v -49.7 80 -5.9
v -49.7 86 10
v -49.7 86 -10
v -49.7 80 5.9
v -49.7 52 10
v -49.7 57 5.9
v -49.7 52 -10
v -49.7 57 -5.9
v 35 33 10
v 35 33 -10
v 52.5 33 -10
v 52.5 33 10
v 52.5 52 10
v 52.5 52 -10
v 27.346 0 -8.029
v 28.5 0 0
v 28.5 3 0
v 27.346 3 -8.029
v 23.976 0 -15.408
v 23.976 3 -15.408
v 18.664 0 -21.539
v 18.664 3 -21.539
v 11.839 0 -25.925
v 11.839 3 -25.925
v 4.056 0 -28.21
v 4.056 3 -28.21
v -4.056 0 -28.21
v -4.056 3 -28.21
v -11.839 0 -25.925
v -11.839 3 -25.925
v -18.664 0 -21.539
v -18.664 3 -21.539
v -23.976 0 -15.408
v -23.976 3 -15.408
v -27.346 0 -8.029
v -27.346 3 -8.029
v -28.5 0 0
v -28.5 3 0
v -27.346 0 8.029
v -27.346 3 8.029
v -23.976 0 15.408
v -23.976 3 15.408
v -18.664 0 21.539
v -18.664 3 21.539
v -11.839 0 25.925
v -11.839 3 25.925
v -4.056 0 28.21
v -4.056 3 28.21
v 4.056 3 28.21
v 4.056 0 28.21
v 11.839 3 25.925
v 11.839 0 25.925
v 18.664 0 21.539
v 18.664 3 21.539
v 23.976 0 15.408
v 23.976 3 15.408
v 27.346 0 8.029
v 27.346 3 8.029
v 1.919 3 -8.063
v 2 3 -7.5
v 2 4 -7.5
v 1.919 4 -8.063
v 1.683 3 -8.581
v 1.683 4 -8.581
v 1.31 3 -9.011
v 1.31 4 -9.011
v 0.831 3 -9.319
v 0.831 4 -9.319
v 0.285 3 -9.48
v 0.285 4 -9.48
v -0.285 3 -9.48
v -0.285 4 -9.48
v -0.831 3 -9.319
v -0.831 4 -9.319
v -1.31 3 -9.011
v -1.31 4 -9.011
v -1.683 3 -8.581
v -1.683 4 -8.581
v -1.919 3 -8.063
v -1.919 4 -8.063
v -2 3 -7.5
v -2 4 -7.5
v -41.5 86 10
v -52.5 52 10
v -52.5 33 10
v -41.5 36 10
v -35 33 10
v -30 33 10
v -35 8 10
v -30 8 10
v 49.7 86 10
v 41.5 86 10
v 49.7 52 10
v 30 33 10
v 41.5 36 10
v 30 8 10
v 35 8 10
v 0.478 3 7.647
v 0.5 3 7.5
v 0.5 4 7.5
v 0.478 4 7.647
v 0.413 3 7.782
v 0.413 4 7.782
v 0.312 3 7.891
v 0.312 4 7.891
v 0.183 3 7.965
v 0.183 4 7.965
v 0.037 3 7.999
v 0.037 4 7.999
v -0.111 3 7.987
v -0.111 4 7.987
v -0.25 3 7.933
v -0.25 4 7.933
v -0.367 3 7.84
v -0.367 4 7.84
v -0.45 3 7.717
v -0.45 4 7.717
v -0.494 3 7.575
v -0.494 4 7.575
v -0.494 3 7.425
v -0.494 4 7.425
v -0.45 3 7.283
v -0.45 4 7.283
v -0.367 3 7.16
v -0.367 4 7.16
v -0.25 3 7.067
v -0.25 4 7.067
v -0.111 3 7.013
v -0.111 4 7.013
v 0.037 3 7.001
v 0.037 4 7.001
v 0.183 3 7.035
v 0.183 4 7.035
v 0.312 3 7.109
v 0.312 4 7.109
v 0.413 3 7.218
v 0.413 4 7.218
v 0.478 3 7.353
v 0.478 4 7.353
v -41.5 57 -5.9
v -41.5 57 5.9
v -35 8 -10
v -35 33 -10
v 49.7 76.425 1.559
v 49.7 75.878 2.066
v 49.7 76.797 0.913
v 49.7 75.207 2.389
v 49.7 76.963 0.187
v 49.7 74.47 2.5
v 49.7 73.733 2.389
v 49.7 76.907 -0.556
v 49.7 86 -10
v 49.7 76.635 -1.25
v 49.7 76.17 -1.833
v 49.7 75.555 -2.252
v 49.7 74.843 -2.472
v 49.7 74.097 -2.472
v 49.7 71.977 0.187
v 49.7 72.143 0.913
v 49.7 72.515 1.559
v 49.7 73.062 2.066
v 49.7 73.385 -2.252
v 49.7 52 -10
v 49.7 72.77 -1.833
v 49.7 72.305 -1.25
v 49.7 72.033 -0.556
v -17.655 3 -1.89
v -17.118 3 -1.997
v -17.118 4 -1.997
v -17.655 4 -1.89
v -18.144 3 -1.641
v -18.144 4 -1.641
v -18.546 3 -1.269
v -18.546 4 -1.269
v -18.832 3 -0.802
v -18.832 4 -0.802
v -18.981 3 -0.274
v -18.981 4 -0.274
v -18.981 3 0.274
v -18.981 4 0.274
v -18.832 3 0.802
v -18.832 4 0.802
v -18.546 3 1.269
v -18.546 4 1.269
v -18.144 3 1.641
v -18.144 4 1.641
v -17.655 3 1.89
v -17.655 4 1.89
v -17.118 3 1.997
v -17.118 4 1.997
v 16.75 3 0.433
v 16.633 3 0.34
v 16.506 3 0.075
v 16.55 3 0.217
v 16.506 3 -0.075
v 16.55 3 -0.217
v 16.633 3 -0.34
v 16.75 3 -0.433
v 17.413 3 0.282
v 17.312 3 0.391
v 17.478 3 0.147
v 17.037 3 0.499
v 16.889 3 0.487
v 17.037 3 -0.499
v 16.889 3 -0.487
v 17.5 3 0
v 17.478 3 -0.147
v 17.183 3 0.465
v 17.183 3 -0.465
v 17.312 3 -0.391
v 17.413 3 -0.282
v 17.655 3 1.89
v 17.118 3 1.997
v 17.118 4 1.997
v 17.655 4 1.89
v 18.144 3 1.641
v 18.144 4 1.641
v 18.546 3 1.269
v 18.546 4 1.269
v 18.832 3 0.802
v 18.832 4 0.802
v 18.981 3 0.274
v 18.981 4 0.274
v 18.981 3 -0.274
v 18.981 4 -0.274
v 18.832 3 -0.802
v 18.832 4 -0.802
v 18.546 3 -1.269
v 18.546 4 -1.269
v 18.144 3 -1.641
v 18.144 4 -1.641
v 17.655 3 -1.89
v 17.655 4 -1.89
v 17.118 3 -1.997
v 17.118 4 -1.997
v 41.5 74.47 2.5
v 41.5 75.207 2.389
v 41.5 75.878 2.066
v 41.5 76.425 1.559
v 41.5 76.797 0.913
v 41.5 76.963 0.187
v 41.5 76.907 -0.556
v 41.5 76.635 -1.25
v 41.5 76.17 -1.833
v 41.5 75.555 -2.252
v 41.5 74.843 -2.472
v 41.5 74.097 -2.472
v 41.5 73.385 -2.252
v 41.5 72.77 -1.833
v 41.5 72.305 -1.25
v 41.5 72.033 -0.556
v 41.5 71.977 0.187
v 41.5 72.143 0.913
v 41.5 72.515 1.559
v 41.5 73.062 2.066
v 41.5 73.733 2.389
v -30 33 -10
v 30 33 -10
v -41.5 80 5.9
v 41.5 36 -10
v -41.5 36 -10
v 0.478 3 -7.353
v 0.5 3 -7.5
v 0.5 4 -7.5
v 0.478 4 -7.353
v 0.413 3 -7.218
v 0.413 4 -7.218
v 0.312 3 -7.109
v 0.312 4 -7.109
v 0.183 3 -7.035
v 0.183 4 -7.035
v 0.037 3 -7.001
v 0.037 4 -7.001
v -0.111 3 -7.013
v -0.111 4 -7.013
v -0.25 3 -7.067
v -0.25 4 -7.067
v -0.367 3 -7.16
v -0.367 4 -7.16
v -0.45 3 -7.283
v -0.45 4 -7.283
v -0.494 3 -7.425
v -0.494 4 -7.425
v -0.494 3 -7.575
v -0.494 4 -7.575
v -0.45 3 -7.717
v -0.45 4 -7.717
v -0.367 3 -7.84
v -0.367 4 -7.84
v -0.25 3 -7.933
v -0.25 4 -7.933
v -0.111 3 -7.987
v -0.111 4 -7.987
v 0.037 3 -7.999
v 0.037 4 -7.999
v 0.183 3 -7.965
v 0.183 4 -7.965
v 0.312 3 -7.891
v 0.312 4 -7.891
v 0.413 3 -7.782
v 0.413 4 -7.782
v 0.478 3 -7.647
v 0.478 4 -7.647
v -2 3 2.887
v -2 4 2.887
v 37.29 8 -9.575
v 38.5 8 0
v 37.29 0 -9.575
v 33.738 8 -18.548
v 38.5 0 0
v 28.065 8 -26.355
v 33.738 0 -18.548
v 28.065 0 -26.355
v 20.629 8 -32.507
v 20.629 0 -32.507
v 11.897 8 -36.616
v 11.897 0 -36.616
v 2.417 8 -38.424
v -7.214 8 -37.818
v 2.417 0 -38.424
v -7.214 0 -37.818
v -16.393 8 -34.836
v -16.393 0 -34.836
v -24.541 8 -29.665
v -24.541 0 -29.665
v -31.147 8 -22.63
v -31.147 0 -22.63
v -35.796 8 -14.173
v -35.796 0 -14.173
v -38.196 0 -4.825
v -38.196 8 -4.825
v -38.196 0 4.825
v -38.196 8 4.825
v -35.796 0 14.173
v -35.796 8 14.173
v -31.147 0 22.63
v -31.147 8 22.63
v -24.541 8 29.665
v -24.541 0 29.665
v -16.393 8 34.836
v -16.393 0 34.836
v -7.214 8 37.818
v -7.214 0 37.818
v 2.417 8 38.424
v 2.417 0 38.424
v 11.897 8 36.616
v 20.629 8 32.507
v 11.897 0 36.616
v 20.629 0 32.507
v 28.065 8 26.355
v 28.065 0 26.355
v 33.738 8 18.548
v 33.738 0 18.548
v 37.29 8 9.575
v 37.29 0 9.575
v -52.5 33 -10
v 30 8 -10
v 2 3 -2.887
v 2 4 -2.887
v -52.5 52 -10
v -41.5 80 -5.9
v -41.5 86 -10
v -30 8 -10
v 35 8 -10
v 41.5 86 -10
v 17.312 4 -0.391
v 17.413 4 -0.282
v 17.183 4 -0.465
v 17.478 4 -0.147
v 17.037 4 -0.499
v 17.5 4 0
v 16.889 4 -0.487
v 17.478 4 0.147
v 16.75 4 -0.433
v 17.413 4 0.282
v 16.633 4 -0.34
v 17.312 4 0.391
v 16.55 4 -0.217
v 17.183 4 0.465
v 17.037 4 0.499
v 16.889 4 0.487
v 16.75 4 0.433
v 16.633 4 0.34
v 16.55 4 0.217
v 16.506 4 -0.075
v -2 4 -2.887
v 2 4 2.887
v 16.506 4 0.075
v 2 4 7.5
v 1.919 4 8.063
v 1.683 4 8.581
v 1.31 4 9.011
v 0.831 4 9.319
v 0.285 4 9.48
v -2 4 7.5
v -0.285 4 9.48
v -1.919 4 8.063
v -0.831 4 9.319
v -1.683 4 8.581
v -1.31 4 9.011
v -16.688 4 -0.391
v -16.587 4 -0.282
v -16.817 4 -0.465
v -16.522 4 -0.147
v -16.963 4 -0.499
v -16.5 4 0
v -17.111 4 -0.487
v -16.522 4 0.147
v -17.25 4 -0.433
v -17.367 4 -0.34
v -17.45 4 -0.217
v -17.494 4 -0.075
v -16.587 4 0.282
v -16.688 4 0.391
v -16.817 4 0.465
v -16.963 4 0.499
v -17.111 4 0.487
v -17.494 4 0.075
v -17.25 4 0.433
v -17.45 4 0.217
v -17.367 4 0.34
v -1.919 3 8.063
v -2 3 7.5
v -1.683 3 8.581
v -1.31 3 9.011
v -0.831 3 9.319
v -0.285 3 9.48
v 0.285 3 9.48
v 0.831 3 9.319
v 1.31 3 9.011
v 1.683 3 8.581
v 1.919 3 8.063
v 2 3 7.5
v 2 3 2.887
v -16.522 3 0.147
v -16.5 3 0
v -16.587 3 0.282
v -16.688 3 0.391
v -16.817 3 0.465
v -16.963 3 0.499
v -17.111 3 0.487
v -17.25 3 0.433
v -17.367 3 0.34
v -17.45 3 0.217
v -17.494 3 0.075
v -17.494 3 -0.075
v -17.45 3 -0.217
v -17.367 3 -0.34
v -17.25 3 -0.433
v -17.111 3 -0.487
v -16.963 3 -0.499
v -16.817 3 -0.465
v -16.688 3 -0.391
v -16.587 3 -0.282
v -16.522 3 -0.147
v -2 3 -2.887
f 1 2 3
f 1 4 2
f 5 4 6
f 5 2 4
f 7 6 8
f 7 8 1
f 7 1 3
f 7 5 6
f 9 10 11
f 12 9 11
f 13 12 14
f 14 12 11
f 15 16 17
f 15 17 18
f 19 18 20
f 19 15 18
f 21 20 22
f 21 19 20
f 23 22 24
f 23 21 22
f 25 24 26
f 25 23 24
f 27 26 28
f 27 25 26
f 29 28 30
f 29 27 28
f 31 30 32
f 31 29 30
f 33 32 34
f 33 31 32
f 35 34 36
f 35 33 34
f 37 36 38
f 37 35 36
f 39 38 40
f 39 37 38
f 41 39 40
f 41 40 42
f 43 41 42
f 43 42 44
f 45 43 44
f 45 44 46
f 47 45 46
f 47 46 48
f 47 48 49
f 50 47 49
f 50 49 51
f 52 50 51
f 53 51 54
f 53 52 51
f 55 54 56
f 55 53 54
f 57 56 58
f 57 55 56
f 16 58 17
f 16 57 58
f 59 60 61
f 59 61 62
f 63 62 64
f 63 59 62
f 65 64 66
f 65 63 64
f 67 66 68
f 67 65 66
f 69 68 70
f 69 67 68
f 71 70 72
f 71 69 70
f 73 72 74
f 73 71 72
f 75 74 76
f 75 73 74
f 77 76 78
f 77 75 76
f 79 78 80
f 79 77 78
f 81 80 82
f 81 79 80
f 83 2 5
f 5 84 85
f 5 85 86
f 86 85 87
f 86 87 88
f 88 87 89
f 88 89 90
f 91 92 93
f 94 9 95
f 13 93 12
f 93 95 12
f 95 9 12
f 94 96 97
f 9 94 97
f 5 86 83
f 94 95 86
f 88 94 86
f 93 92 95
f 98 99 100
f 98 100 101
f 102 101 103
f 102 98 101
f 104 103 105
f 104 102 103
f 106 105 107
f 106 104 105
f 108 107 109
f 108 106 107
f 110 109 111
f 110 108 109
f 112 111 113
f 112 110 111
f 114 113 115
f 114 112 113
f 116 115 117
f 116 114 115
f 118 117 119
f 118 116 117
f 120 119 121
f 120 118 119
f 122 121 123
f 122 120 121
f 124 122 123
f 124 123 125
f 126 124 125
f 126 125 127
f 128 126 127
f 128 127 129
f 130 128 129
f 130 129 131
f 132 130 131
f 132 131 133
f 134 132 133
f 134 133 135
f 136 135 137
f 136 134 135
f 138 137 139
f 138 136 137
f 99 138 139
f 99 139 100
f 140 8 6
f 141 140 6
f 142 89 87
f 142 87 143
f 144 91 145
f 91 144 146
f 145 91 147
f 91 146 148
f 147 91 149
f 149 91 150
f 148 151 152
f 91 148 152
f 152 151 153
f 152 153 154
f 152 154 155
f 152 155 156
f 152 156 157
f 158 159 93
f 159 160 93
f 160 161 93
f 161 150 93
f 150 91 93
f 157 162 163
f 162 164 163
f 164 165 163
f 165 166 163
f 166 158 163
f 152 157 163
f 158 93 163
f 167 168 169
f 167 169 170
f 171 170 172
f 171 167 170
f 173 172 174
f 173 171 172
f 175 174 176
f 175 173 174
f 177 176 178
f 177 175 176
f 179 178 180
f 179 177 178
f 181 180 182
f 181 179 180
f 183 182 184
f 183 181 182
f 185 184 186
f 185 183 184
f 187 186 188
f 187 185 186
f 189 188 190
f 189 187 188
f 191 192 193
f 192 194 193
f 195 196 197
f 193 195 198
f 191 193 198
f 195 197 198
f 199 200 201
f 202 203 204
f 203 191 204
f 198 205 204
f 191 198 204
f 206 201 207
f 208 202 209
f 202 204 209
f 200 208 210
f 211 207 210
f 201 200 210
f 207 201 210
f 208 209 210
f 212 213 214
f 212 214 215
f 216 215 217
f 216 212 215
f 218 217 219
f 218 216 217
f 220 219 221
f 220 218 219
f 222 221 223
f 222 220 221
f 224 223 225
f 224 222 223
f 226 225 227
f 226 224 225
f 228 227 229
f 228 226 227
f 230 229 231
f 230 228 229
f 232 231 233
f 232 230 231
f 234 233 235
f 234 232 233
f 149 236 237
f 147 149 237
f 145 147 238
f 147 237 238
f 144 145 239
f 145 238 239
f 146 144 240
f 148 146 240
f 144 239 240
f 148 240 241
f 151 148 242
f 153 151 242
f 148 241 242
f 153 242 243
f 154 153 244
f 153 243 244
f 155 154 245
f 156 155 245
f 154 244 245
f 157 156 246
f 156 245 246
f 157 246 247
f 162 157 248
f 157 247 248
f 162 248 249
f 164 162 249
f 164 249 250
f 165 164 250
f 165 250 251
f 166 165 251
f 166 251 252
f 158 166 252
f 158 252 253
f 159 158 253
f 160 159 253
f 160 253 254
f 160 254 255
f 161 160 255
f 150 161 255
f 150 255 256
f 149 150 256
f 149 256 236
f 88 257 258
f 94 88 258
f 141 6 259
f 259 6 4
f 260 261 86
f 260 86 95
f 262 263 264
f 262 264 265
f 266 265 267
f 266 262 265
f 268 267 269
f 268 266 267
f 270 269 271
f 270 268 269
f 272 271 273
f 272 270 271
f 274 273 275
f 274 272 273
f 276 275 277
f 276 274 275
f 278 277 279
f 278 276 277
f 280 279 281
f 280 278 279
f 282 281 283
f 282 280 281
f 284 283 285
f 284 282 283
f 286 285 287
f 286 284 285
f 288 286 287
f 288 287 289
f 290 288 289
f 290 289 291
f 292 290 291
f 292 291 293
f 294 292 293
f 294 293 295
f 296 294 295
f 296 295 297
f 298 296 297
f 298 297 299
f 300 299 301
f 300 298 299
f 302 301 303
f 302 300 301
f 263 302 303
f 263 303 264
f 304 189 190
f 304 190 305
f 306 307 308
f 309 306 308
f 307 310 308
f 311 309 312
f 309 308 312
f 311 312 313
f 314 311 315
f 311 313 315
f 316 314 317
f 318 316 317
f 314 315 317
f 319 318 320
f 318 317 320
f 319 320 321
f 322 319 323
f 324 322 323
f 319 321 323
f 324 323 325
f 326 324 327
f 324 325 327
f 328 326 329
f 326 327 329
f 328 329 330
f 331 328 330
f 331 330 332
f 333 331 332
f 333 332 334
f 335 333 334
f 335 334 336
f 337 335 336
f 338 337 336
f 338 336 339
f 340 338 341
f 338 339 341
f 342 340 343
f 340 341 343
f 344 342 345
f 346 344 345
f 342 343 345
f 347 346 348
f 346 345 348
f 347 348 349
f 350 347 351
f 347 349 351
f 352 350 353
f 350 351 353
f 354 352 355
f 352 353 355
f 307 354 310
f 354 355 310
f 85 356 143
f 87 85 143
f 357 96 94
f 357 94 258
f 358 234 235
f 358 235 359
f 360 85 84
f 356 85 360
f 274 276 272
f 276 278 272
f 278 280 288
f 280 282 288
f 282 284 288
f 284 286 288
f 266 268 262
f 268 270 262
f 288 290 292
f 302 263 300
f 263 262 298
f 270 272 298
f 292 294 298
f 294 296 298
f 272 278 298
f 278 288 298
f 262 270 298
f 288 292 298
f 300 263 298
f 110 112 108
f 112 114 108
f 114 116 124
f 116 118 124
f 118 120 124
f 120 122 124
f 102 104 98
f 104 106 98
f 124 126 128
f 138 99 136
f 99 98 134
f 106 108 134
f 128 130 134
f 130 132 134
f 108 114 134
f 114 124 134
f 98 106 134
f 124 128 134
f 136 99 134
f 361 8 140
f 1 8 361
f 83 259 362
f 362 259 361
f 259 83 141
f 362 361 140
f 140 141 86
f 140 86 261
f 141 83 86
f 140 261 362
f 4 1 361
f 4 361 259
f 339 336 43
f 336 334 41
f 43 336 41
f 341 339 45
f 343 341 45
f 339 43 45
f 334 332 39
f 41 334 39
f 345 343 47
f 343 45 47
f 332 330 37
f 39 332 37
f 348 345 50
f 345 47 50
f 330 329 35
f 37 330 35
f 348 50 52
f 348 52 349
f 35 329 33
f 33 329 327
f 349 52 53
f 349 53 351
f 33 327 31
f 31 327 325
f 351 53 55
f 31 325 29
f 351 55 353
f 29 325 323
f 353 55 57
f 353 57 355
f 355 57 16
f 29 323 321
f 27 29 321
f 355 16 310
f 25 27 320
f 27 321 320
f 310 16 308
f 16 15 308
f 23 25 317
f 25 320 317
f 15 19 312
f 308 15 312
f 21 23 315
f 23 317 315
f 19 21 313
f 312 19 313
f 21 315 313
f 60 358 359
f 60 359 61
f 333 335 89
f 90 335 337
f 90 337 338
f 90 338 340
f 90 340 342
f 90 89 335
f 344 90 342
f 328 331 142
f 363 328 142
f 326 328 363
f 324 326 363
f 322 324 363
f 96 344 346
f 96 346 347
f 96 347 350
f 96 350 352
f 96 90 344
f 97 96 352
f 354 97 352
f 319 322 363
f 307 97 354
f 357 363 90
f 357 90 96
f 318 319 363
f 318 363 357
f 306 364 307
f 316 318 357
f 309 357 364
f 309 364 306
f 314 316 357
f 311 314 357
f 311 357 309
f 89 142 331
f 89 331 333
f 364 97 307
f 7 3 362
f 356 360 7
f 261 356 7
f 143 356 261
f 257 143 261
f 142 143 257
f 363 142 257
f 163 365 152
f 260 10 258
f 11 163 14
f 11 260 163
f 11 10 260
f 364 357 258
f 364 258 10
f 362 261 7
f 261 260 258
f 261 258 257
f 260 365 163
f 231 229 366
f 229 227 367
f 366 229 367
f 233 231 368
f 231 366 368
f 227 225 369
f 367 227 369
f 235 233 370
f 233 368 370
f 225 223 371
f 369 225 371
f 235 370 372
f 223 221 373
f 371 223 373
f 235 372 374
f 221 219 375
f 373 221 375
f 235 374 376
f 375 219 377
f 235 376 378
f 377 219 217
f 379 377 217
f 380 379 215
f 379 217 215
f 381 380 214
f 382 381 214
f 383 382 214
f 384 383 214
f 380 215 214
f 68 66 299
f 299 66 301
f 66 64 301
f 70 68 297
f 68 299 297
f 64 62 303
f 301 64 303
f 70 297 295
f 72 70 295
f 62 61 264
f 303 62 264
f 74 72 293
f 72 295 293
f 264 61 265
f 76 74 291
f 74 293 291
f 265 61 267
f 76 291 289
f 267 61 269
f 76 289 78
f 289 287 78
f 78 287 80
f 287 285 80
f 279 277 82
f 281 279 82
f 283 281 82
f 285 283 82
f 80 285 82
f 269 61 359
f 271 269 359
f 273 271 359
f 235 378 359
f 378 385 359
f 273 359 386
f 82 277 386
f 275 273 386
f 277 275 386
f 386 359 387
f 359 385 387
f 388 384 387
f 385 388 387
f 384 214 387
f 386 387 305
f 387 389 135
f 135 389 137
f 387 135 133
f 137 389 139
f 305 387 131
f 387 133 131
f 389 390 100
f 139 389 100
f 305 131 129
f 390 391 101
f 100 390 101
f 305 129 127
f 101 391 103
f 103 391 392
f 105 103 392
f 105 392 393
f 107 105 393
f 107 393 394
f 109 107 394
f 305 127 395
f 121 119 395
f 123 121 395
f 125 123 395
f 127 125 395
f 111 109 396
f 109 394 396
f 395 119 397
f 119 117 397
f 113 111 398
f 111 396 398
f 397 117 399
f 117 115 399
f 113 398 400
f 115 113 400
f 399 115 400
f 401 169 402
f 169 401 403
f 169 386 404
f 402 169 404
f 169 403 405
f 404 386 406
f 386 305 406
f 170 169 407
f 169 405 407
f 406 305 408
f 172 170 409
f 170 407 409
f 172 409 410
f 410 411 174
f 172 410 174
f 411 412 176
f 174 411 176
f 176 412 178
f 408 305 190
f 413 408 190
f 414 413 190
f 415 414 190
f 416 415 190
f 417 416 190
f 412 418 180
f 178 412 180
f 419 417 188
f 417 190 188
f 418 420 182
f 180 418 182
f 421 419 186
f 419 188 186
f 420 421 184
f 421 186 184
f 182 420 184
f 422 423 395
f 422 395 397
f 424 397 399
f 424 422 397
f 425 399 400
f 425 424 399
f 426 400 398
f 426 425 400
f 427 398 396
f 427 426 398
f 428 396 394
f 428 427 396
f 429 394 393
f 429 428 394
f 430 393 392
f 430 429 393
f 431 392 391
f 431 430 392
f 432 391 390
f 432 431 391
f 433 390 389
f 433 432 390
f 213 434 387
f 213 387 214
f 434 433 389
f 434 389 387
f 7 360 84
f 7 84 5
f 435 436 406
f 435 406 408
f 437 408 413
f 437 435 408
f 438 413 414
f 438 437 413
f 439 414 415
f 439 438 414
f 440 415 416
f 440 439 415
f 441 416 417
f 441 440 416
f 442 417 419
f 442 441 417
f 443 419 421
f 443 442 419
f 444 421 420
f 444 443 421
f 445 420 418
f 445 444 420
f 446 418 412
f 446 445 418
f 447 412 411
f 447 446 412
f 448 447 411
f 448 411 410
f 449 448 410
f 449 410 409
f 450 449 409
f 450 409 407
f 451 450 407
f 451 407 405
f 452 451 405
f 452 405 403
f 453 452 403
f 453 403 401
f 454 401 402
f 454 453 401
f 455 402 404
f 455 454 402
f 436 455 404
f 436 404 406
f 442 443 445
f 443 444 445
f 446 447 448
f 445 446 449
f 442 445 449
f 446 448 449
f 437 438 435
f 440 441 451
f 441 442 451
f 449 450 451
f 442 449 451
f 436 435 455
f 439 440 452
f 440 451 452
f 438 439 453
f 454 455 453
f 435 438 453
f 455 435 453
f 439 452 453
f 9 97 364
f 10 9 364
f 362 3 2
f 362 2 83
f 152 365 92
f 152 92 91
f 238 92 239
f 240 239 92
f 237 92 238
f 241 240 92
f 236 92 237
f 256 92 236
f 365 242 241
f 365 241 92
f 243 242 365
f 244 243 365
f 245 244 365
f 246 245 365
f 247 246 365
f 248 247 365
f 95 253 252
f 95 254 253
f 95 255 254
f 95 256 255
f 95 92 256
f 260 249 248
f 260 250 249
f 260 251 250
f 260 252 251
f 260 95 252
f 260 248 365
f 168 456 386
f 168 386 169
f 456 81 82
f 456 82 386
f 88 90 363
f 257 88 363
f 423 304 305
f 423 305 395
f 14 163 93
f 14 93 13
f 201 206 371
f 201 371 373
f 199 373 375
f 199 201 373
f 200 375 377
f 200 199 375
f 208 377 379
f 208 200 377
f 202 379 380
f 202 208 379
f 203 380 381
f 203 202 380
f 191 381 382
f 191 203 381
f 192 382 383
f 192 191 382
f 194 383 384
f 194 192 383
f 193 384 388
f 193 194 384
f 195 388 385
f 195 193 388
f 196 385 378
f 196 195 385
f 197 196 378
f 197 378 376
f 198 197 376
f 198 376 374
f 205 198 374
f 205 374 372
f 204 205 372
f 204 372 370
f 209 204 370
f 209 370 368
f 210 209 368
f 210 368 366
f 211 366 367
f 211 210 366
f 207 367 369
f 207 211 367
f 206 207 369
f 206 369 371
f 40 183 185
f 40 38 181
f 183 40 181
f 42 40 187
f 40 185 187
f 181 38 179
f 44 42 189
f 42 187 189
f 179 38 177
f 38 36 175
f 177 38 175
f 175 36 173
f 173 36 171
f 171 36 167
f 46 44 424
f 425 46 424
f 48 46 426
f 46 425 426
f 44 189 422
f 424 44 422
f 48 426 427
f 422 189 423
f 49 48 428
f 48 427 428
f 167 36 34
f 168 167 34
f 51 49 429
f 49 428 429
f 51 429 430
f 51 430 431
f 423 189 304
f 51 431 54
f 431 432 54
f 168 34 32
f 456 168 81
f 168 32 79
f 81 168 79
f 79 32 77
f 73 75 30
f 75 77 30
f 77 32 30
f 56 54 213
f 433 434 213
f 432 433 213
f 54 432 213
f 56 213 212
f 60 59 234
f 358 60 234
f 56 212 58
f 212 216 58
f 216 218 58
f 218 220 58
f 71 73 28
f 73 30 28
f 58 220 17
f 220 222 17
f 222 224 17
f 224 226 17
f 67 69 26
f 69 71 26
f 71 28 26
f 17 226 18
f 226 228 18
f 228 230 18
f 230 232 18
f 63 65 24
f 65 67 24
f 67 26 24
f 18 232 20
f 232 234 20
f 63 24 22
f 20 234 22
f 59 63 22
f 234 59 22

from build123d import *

# Parameters (mm, degrees)
SKETCH1_R           = 38.5
SKETCH1_R_2         = 28.5
BOSS_EXTRUDE1_DEPTH = 3
SKETCH3_R           = 38.5
BOSS_EXTRUDE2_DEPTH = 5
SKETCH4_W           = 5
SKETCH4_H           = 20
BOSS_EXTRUDE3_DEPTH = 25
SKETCH5_W           = 105
SKETCH5_H           = 20
BOSS_EXTRUDE4_DEPTH = 3
SKETCH6_W           = 2.8
SKETCH6_H           = 20
BOSS_EXTRUDE5_DEPTH = 16
SKETCH7_W           = 8.2
SKETCH7_H           = 20
BOSS_EXTRUDE6_DEPTH = 50
SKETCH8_W           = 11.8
SKETCH8_H           = 23
CUT_EXTRUDE1_DEPTH  = 50
SKETCH9_R           = 2.5
CUT_EXTRUDE2_DEPTH  = 50
SKETCH10_R          = 0.5
CUT_EXTRUDE3_DEPTH  = 1


with BuildPart() as part:
    # Sketch1 → Boss-Extrude1 (new body)
    with BuildSketch(Plane(origin=(0, 0, 0), x_dir=(1, 0, 0), z_dir=(0, 1, 0))):
        Circle(SKETCH1_R)
        Circle(SKETCH1_R_2, mode=Mode.SUBTRACT)
    extrude(amount=BOSS_EXTRUDE1_DEPTH)

    # Sketch3 → Boss-Extrude2 (add)
    with BuildSketch(Plane(origin=(0, 3, 0), x_dir=(1, 0, 0), z_dir=(0, 1, 0))):
        Circle(SKETCH3_R)
    extrude(amount=BOSS_EXTRUDE2_DEPTH)

    # Sketch4 → Boss-Extrude3 (add)
    with BuildSketch(Plane(origin=(0, 8, 0), x_dir=(1, 0, 0), z_dir=(0, 1, 0))):
        with Locations((-32.5, 0)):
            Rectangle(SKETCH4_W, SKETCH4_H)
        with Locations((32.5, 0)):
            Rectangle(SKETCH4_W, SKETCH4_H)
    extrude(amount=BOSS_EXTRUDE3_DEPTH)

    # Sketch5 → Boss-Extrude4 (add)
    with BuildSketch(Plane(origin=(0, 33, 0), x_dir=(1, 0, 0), z_dir=(0, 1, 0))):
        Rectangle(SKETCH5_W, SKETCH5_H)
    extrude(amount=BOSS_EXTRUDE4_DEPTH)

    # Sketch6 → Boss-Extrude5 (add)
    with BuildSketch(Plane(origin=(0, 36, 0), x_dir=(1, 0, 0), z_dir=(0, 1, 0))):
        with Locations((-51.1, 0)):
            Rectangle(SKETCH6_W, SKETCH6_H)
        with Locations((51.1, 0)):
            Rectangle(SKETCH6_W, SKETCH6_H)
    extrude(amount=BOSS_EXTRUDE5_DEPTH)

    # Sketch7 → Boss-Extrude6 (add)
    with BuildSketch(Plane(origin=(0, 36, 0), x_dir=(1, 0, 0), z_dir=(0, 1, 0))):
        with Locations((-45.6, 0)):
            Rectangle(SKETCH7_W, SKETCH7_H)
        with Locations((45.6, 0)):
            Rectangle(SKETCH7_W, SKETCH7_H)
    extrude(amount=BOSS_EXTRUDE6_DEPTH)

    # Sketch8 → Cut-Extrude1 (cut)
    with BuildSketch(Plane.ZY.offset(49.7)):
        with Locations((0, 68.5)):
            Rectangle(SKETCH8_W, SKETCH8_H)
    extrude(amount=-CUT_EXTRUDE1_DEPTH, mode=Mode.SUBTRACT)

    # Sketch9 → Cut-Extrude2 (cut)
    with BuildSketch(Plane.ZY.offset(-41.5)):
        with Locations((0, 74.47)):
            Circle(SKETCH9_R)
    extrude(amount=-CUT_EXTRUDE2_DEPTH, mode=Mode.SUBTRACT)

    # Sketch10 → Cut-Extrude3 (cut)
    with BuildSketch(Plane.XZ.offset(-3)):
        with BuildLine():
            Line((2, 7.5), (2, 2.88735269))
            Line((2, 2.88735269), (17.117647059, 1.996536794))
            ThreePointArc((17.117647059, 1.996536794), (19, 0), (17.117647059, -1.996536794))
            Line((17.117647059, -1.996536794), (2, -2.88735269))
            Line((2, -2.88735269), (2, -7.5))
            ThreePointArc((2, -7.5), (0, -9.5), (-2, -7.5))
            Line((-2, -7.5), (-2, -2.88735269))
            Line((-2, -2.88735269), (-17.117647059, -1.996536794))
            ThreePointArc((-17.117647059, -1.996536794), (-19, 0), (-17.117647059, 1.996536794))
            Line((-17.117647059, 1.996536794), (-2, 2.88735269))
            Line((-2, 2.88735269), (-2, 7.5))
            ThreePointArc((-2, 7.5), (0, 9.5), (2, 7.5))
        make_face()
        with Locations((-17, 0)):
            Circle(SKETCH10_R, mode=Mode.SUBTRACT)
        with Locations((17, 0)):
            Circle(SKETCH10_R, mode=Mode.SUBTRACT)
        with Locations((0, 7.5)):
            Circle(SKETCH10_R, mode=Mode.SUBTRACT)
        with Locations((0, -7.5)):
            Circle(SKETCH10_R, mode=Mode.SUBTRACT)
    extrude(amount=-CUT_EXTRUDE3_DEPTH, mode=Mode.SUBTRACT)


solid = part.part
